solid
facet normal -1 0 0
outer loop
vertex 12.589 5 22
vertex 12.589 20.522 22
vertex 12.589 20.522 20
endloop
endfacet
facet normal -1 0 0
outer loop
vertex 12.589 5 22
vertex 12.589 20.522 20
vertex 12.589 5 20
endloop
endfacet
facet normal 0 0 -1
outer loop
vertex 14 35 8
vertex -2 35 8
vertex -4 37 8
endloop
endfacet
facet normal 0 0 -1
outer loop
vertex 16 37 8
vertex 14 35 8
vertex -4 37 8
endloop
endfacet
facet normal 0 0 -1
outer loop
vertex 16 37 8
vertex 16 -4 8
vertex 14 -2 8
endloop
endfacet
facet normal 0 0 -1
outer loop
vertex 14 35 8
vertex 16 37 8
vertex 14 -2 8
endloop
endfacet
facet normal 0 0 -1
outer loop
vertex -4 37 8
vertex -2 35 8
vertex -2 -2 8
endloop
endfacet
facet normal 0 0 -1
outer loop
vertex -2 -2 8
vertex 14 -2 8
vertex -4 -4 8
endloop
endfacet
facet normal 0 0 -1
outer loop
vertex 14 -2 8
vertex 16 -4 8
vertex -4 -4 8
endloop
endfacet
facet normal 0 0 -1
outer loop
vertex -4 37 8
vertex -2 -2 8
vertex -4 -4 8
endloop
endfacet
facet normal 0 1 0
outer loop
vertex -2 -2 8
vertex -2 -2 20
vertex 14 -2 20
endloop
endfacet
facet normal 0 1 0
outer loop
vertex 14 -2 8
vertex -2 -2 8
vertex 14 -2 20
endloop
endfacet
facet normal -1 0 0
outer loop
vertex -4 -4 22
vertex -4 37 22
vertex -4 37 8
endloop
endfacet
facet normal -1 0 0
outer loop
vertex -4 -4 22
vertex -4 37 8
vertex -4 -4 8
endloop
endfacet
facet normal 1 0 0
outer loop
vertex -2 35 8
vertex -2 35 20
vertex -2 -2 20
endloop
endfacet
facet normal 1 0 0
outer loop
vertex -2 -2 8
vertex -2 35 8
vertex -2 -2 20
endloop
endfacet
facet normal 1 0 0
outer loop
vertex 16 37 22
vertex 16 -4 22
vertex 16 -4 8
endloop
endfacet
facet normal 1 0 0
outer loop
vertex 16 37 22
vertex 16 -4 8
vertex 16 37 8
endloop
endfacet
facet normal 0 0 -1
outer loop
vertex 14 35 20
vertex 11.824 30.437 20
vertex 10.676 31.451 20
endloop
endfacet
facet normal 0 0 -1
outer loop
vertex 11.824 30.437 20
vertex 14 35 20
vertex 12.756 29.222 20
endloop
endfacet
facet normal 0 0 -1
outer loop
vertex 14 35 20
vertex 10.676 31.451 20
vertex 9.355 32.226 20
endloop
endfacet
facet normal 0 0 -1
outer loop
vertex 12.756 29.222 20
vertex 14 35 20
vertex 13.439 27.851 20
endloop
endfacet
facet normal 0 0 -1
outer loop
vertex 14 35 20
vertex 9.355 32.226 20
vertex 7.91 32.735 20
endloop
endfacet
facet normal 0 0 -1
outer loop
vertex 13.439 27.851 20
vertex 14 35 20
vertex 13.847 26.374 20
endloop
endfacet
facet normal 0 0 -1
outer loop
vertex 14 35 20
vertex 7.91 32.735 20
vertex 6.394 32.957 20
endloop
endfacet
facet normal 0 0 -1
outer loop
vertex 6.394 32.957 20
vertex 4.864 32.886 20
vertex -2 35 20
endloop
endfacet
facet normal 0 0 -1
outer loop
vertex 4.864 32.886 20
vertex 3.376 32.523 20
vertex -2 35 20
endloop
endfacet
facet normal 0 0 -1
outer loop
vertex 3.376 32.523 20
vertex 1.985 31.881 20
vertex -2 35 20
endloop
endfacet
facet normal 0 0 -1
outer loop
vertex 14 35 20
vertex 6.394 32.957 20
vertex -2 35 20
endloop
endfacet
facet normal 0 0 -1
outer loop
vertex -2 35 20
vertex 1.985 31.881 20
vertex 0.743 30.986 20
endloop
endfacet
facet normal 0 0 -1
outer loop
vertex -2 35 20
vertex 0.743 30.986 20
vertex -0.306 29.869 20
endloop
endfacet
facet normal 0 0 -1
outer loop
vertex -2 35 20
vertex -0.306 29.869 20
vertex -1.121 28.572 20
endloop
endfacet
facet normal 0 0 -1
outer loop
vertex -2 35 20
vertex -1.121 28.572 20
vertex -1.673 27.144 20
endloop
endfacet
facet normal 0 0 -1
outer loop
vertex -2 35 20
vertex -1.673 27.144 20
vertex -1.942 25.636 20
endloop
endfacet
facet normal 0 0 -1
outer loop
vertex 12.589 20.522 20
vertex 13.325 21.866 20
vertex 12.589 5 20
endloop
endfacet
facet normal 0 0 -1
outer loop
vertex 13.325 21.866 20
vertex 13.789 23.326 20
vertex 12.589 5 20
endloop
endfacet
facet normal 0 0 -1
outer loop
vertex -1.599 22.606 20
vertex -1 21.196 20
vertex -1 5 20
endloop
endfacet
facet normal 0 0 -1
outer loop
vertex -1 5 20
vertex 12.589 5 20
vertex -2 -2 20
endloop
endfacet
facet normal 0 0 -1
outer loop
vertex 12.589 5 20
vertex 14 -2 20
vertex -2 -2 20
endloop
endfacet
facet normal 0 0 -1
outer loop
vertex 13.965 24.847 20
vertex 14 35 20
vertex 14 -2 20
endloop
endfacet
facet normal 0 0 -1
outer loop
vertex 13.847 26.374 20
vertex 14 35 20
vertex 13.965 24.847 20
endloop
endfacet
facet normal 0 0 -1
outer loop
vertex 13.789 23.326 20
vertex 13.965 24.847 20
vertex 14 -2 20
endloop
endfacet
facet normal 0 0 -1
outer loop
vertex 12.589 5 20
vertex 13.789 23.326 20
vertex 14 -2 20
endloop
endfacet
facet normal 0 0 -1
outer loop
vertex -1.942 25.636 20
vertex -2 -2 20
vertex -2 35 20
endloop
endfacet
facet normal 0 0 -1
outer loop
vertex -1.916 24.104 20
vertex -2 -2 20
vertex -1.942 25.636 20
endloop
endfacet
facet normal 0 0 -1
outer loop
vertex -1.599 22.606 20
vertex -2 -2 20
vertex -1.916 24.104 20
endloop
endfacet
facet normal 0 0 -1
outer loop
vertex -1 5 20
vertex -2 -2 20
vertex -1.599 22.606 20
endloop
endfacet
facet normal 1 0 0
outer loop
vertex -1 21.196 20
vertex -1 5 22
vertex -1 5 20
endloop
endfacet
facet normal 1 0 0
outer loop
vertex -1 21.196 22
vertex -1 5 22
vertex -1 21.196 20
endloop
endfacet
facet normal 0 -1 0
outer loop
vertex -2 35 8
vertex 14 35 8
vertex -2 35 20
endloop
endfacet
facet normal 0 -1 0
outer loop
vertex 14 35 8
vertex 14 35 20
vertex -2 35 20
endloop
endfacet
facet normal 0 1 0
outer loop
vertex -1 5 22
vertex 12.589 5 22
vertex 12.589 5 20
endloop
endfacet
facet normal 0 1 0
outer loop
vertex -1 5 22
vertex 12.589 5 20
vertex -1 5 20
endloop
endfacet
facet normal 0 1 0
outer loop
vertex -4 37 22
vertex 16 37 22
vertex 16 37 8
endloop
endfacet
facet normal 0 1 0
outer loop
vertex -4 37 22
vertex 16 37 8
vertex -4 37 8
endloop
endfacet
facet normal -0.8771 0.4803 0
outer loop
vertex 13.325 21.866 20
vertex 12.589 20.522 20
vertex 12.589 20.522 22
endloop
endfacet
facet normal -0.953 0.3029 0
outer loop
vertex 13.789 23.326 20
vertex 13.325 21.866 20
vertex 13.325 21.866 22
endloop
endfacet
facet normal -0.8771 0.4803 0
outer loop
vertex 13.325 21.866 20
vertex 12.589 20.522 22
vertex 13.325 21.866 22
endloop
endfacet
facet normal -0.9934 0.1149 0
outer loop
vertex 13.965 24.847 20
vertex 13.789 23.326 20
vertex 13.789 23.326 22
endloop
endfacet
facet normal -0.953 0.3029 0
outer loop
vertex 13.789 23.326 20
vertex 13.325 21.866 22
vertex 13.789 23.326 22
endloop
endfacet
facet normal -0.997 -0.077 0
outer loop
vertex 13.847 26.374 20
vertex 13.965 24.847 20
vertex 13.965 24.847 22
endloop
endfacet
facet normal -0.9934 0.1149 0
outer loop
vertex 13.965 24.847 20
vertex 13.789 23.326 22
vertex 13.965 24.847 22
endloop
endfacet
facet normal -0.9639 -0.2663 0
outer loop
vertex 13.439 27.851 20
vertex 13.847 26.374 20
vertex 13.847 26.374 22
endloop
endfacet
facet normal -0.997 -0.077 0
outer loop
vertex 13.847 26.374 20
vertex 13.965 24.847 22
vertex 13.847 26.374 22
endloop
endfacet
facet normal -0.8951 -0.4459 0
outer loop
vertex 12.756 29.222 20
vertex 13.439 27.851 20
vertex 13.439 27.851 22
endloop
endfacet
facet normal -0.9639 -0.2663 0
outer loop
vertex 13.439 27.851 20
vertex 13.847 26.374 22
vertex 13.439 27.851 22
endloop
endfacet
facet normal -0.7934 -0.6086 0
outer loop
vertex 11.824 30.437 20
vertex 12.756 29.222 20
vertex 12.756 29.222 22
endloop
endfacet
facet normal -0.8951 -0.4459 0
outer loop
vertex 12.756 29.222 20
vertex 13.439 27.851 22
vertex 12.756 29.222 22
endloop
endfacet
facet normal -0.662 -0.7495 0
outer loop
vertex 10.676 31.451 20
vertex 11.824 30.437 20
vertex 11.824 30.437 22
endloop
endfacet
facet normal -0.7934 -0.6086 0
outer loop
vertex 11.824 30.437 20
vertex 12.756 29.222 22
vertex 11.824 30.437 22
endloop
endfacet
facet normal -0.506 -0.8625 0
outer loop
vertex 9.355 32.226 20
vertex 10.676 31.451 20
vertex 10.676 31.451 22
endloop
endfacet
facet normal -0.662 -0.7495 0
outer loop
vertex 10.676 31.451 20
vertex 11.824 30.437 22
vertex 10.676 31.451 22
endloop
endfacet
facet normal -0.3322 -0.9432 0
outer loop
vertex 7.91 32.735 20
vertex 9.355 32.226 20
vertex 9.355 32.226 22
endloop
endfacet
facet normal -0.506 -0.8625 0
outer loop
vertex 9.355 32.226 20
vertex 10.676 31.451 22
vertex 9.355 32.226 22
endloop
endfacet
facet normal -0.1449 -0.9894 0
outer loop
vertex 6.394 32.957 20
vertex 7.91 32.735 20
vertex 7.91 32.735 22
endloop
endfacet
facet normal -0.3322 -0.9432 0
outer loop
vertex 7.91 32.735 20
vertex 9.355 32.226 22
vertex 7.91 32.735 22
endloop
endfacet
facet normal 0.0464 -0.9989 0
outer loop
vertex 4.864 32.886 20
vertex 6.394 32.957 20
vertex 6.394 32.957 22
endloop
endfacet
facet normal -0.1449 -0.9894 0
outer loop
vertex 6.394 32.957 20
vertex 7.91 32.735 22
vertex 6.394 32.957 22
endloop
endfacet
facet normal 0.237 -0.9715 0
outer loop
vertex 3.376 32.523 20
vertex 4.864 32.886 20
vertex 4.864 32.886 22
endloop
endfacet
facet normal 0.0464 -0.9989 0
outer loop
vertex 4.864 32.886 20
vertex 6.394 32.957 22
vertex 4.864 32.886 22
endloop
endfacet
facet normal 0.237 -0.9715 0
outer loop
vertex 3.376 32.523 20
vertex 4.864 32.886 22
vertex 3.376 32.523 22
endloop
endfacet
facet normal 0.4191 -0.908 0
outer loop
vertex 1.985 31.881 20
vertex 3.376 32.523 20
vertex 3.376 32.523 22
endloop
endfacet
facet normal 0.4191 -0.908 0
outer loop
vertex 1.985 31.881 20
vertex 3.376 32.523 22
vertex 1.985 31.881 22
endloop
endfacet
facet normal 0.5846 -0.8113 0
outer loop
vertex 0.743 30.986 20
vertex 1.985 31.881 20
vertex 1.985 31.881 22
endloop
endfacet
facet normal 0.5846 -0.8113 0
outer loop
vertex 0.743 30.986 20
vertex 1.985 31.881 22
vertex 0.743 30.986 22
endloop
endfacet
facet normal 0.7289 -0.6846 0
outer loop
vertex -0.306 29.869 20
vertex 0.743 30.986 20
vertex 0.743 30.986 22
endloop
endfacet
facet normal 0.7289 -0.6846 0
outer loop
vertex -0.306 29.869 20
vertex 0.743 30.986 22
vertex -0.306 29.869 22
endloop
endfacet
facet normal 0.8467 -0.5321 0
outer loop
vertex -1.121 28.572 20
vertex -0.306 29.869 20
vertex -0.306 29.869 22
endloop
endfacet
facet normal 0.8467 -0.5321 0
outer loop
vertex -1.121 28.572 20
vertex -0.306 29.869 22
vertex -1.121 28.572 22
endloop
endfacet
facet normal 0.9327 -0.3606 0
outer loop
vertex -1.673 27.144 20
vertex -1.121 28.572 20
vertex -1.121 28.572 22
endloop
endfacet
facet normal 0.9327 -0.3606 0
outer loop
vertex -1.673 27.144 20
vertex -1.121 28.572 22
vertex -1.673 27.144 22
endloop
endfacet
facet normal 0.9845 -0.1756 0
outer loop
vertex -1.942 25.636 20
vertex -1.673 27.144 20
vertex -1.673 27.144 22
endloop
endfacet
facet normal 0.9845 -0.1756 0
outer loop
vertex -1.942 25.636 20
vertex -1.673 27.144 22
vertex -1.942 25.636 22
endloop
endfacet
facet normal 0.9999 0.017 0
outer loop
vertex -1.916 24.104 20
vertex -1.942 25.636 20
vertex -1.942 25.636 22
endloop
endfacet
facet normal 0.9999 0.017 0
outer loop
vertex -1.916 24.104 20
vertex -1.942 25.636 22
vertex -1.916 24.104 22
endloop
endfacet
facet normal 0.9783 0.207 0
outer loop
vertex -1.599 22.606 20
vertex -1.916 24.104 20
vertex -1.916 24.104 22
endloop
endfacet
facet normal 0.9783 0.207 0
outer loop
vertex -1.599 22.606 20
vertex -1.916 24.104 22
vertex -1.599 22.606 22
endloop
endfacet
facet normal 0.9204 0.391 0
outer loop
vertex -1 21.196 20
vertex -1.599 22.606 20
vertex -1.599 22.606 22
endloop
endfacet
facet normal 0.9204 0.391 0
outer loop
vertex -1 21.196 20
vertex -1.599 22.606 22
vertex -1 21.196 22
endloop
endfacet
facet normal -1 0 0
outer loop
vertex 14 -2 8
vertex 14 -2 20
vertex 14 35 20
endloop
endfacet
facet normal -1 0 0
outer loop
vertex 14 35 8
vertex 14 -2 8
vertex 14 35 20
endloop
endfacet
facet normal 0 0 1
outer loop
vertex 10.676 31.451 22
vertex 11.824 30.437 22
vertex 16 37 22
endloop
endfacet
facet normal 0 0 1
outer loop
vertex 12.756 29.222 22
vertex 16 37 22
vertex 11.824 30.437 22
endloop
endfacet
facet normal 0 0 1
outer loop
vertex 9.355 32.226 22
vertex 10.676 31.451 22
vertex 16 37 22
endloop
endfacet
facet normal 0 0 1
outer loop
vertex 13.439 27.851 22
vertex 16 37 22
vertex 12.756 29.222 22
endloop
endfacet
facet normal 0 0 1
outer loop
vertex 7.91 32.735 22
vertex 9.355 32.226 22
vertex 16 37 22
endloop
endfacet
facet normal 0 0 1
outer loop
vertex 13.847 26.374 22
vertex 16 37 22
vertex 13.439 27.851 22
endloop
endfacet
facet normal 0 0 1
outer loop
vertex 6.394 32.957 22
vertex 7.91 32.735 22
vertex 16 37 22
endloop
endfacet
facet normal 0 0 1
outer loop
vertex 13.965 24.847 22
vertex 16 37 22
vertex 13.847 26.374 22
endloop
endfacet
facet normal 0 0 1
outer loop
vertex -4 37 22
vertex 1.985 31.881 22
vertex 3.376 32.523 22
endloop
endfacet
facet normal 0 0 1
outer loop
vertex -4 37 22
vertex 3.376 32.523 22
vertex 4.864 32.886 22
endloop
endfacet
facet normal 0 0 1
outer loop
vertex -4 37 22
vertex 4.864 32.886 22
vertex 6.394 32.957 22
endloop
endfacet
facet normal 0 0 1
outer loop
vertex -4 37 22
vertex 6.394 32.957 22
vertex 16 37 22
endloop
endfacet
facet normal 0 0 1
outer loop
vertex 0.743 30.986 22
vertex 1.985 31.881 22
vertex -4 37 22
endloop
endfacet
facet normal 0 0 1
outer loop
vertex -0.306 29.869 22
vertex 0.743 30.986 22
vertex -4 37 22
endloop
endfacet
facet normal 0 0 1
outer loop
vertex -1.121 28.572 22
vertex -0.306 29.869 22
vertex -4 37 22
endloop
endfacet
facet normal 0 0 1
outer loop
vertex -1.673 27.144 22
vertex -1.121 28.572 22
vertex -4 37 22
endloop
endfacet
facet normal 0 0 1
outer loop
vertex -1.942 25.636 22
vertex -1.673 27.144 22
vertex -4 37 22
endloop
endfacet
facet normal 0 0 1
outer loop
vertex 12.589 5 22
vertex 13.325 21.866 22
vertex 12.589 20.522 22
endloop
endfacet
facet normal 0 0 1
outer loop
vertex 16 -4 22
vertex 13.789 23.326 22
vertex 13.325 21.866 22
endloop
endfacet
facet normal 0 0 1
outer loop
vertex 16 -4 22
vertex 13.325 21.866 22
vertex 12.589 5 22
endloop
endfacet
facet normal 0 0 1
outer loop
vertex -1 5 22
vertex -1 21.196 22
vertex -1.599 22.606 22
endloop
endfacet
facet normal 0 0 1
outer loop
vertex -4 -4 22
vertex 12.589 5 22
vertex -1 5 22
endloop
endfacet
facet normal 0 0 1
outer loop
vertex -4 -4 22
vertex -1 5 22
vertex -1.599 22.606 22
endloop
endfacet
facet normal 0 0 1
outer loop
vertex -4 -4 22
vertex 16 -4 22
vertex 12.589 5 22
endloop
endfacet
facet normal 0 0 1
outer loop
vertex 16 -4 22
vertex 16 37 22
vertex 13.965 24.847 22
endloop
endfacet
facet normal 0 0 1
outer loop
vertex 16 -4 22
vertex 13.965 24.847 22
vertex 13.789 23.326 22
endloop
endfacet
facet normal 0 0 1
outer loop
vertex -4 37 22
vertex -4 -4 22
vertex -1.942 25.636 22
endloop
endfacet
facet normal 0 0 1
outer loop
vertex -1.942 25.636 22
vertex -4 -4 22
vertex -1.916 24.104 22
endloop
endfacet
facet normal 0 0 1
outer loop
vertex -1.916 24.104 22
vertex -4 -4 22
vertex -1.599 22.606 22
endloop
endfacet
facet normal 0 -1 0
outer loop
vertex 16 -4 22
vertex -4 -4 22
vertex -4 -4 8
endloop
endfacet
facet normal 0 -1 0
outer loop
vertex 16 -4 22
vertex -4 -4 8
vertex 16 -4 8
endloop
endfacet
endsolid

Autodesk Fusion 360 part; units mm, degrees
sketch "Sketch1" plane through (0, 0, 0) normal (0, 0, 1) x (1, 0, 0)
  line L0 (0, 0) -> (12, 0)
  line L1 (12, 0) -> (12, 33)
  line L2 (12, 33) -> (0, 33)
  line L3 (0, 33) -> (0, 0)
  line L4 (-2, 35) -> (14, 35)
  line L5 (14, 35) -> (14, -2)
  line L6 (14, -2) -> (-2, -2)
  line L7 (-2, -2) -> (-2, 35)
  dimension "d1" = 33
  dimension "d2" = 12
  dimension "d3" = 2
  dimension "d4" = 2
  dimension "d5" = 2
  dimension "d6" = 2
extrude "Extrude1" add sketch "Sketch1" along normal blind 20 makes body 1
extrude "Extrude2" add sketch "Sketch1" against normal blind 2 contours L0 L1 L2 L3 | L4 L5 L6 L7 bodies 1
sketch "Sketch2" plane through (0, 0, 20) normal (0, 0, 1) x (-1, 0, 0)
  line L0 (0, 0) -> (0, -33)
  line L1 (0, -33) -> (-12, -33)
  line L2 (-12, -33) -> (-12, 0)
  line L3 (-12, 0) -> (0, 0)
  line L4 (2, 2) -> (-14, 2)
  line L5 (-14, 2) -> (-14, -35)
  line L6 (-14, -35) -> (2, -35)
  line L7 (2, -35) -> (2, 2)
  line L8 (4, 4) -> (-16, 4)
  line L9 (-16, 4) -> (-16, -37)
  line L10 (-16, -37) -> (4, -37)
  line L11 (4, -37) -> (4, 4)
  dimension "d11" = 2
extrude "Extrude3" add sketch "Sketch2" against normal blind 12 separate body contours L8 L9 L10 L11 makes body 2
sketch "Sketch3" plane through (0, 0, 20) normal (0, 0, 1) x (-1, 0, 0)
  line L0 (2, 2) -> (2, -35)
  line L1 (2, -35) -> (-14, -35)
  line L2 (-14, -35) -> (-14, 2)
  line L3 (-14, 2) -> (2, 2)
  line L4 (4, -37) -> (4, 4)
  line L5 (4, 4) -> (-16, 4)
  line L6 (-16, 4) -> (-16, -37)
  line L7 (-16, -37) -> (4, -37)
extrude "Extrude5" add sketch "Sketch3" along normal blind 2 contours L0 L1 L2 L3 | L4 L5 L6 L7 bodies 2
sketch "Sketch4" plane through (0, 0, 22) normal (0, 0, 1) x (-1, 0, 0)
  line L0 (-16, -37) -> (4, -37)
  line L1 (4, -37) -> (4, 4)
  line L2 (4, 4) -> (-16, 4)
  line L3 (-16, 4) -> (-16, -37)
  circle A0 centre (-6, -25) radius 7.9669
  line L4 (-12.5894, -20.5221) -> (-12.5894, -5)
  line L5 (-12.5894, -5) -> (1, -5)
  line L6 (1, -5) -> (1, -21.1958)
  dimension "d20" = 15.9338
extrude "Extrude6" cut sketch "Sketch4" against normal blind 2 contours A0 | A0 L4 L5 L6 bodies 2
hidden bodies 1
